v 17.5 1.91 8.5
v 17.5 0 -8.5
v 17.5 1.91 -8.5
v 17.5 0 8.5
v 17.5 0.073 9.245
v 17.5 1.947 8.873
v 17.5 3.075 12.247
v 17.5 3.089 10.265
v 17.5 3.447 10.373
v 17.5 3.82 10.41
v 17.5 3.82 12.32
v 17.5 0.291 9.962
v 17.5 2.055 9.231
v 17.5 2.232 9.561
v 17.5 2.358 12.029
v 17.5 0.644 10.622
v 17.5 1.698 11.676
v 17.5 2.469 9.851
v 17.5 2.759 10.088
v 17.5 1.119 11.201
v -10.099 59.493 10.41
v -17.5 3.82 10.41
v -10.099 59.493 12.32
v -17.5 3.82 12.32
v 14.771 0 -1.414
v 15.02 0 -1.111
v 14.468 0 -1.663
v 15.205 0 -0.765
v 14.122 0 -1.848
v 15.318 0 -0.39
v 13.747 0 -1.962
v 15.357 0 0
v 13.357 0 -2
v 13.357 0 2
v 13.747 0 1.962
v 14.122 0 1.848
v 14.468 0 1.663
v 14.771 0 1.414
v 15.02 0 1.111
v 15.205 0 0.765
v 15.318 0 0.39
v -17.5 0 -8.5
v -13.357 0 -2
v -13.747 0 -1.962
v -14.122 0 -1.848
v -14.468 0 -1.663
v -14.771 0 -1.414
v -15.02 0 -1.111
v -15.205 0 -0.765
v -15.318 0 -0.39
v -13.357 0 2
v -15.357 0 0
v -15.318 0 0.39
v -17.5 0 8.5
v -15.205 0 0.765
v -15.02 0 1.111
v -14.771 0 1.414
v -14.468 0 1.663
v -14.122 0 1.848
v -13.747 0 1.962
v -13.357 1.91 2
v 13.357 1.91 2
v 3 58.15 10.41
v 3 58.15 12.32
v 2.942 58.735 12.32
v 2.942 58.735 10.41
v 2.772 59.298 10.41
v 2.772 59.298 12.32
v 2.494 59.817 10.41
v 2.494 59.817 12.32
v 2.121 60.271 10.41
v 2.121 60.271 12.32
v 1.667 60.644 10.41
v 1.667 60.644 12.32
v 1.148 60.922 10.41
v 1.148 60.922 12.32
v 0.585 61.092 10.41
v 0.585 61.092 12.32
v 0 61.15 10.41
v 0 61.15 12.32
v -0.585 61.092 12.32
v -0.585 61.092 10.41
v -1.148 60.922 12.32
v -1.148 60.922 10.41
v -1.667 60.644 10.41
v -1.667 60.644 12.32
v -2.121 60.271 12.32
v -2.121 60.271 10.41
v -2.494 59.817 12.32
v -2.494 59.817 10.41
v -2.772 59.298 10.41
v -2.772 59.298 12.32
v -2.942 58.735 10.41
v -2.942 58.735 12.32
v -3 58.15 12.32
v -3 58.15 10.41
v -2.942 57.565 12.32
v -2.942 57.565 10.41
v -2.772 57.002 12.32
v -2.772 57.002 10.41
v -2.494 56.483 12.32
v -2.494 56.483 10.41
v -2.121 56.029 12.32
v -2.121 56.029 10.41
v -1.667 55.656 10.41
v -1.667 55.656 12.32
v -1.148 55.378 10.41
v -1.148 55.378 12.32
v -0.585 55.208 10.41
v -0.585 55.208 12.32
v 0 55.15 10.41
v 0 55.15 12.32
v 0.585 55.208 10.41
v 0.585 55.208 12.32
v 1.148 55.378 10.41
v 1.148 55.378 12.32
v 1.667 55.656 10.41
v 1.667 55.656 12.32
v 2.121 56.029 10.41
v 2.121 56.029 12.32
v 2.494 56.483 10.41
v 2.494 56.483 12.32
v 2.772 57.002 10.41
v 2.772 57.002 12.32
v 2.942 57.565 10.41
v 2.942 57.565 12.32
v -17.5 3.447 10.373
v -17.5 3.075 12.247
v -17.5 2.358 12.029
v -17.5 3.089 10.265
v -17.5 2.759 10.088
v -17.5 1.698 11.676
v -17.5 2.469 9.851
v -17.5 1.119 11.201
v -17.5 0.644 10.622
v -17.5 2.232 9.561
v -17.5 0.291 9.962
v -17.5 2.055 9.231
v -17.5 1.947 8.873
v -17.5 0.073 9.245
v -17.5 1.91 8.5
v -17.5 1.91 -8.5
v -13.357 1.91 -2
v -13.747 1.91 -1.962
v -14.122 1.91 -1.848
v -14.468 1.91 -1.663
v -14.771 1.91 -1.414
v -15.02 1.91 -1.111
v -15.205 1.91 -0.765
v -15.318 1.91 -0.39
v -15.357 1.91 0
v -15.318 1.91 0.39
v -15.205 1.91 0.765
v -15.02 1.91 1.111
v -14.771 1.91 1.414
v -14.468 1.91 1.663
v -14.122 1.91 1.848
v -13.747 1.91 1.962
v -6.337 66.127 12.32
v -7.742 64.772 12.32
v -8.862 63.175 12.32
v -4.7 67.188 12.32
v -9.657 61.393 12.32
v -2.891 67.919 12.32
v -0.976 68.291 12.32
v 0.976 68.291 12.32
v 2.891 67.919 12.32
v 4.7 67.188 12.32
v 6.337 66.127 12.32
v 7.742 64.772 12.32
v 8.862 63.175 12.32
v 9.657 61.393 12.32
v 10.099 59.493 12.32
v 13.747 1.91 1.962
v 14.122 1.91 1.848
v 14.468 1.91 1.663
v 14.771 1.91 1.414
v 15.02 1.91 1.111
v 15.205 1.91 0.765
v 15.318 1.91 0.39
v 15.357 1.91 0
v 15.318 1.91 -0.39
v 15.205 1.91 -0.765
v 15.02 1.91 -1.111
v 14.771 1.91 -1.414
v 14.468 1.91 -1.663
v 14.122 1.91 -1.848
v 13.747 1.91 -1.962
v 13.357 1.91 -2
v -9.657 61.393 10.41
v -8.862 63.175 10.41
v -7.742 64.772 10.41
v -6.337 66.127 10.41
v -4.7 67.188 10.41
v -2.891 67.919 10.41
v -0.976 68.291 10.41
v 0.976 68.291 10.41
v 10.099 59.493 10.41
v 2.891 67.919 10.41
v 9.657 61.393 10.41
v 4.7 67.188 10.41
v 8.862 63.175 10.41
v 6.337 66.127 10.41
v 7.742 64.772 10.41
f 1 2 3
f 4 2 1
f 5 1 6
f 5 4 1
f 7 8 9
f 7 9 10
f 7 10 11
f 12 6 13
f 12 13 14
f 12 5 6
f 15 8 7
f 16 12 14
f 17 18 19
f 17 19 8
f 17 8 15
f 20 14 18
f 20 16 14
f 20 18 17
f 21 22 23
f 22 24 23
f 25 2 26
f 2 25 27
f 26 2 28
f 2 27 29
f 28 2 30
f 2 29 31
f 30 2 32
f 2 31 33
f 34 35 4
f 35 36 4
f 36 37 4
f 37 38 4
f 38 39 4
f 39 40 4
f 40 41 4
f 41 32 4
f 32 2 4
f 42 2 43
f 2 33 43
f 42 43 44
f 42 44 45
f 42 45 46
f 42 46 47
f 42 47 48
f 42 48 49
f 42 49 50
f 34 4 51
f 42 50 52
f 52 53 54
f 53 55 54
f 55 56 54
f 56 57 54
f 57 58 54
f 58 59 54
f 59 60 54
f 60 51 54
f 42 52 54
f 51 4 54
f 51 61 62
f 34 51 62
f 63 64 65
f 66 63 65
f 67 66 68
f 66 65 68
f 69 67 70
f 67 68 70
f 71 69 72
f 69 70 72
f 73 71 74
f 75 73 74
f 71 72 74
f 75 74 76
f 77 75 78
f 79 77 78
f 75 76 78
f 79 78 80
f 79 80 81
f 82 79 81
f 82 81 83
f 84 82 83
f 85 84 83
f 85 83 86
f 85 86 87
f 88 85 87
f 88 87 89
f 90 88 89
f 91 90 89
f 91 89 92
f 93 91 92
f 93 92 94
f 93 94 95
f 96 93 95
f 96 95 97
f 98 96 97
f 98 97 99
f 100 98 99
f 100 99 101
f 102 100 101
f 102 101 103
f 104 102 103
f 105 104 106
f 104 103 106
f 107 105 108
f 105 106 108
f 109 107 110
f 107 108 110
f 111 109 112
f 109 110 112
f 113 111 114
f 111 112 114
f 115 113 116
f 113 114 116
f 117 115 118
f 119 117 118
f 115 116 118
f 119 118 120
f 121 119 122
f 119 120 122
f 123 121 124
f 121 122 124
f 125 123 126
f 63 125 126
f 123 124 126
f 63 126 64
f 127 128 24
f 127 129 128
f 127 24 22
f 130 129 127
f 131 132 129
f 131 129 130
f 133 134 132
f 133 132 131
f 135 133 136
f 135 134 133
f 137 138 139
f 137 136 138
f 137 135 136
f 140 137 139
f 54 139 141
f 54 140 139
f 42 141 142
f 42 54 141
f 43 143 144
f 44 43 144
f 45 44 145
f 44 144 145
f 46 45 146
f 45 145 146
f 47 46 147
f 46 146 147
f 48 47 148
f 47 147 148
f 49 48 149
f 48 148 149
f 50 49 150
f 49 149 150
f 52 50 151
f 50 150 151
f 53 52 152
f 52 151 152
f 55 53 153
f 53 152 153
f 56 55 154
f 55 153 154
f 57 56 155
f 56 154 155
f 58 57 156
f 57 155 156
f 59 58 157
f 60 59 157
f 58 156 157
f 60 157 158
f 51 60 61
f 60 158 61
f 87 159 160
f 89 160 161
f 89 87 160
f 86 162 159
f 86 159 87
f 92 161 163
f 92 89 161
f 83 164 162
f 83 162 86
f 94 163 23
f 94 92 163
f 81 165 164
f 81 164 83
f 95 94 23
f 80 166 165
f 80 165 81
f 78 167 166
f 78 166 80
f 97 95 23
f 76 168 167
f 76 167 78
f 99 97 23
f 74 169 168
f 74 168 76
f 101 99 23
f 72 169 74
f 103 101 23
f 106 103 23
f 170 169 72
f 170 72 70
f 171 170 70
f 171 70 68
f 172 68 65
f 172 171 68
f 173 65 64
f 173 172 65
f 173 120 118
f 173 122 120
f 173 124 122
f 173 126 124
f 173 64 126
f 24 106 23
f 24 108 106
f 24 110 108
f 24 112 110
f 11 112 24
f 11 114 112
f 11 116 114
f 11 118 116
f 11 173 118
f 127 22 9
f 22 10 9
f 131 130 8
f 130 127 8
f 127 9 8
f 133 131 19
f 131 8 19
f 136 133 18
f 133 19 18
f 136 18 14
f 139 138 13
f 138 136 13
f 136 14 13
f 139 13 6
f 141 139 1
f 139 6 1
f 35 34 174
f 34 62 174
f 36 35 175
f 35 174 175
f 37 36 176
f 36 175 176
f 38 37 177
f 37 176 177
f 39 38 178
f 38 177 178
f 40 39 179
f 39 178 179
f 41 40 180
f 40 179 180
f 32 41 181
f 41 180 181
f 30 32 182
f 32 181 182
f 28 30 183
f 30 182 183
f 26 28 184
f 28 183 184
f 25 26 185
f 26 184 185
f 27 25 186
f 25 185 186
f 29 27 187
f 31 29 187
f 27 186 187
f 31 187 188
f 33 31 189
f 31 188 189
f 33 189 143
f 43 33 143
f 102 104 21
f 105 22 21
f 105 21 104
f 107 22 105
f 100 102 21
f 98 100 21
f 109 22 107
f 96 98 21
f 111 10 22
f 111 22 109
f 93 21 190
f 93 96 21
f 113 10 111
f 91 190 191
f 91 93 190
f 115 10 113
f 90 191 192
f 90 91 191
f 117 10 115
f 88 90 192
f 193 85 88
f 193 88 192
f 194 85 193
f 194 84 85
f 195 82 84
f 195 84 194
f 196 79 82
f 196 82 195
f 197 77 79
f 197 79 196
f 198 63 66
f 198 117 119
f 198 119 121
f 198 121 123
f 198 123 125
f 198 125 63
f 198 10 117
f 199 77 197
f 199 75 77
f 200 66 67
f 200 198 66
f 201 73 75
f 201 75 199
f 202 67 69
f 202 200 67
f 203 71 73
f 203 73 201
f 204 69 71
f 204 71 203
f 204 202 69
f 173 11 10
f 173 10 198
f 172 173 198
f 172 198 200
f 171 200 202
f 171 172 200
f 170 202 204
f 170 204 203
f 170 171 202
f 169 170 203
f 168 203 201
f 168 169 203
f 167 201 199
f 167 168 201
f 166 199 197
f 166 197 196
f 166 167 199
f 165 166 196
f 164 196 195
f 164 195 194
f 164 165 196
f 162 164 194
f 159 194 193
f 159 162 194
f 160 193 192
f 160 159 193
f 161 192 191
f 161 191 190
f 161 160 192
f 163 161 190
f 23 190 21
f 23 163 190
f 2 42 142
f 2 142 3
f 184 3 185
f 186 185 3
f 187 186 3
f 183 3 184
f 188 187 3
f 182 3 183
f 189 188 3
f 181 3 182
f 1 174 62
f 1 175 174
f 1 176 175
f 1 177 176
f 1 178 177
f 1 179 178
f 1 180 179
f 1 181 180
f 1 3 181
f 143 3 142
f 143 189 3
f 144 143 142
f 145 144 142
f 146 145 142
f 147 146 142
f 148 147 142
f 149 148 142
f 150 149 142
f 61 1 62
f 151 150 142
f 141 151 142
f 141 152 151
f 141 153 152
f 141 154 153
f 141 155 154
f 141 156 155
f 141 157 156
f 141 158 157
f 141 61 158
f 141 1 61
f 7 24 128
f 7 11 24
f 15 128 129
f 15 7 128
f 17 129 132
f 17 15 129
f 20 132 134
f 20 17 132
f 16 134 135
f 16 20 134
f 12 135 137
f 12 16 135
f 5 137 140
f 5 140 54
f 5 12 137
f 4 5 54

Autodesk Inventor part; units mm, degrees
ref_plane "YZ Plane" through (0, 0, 0) normal (1, 0, 0) x (0, 1, 0)
ref_plane "XZ Plane" through (0, 0, 0) normal (0, 1, 0) x (-1, 0, 0)
ref_plane "XY Plane" through (0, 0, 0) normal (0, 0, 1) x (1, 0, 0)
sketch "Boceto1" plane through (0, 0, 0) normal (0, 1, 0) x (-1, 0, 0)
  line L0 (-17.5, 8.5) -> (17.5, 8.5)
  line L1 (17.5, 8.5) -> (17.5, -8.5)
  line L2 (17.5, -8.5) -> (-17.5, -8.5)
  line L3 (-17.5, -8.5) -> (-17.5, 8.5)
  line L4 (-17.5, 8.5) -> (17.5, -8.5) construction
  line L5 (17.5, 8.5) -> (-17.5, -8.5) construction
  point P0 (0, 0)
  dimension "d0" = 35
  dimension "d1" = 17
extrude "Placa1" add sketch "Boceto1" along normal blind 1.91
sketch "Boceto2" plane through (17.5, 3.82, 10.41) normal (0, 0, 1) x (1, 0, 0)
  line L0 (-35, 0) -> (0, 0)
  line L1 (0, 0) -> (0, 66.18)
  line L2 (0, 66.18) -> (-35, 66.18)
  line L3 (-35, 66.18) -> (-35, 0)
edge flange "Pestaña1" height 70 angle 90 thickness 1.91 bend radius 1.91 thickness toward (0, 0, 1) relief tear relief width 1.91 relief depth 0.955 edges at (0, 1.91, 8.5) wall of the first edge with corners at (-17.5, 3.82, 10.41) (17.5, 3.82, 10.41) (17.5, 70, 10.41) (-17.5, 70, 10.41)
bend "Doblez1"
corner "Esquina1"
sketch "Boceto5" plane through (-17.5, 70, 12.32) normal (0, 0, 1) x (1, 0, 0)
  arc A0 (27.5986, -10.5074) -> (7.4014, -10.5074) centre (17.5, -11.85) ccw
  line L0 (0, -66.18) -> (7.4014, -10.5074)
  line L1 (35, -66.18) -> (27.5986, -10.5074)
  line L2 (0, 0) -> (35, 0) projected
  line L3 (0, -66.18) -> (0, 0)
  line L4 (0, 0) -> (35, 0)
  line L5 (35, 0) -> (35, -66.18)
  point P0 (17.5, -70)
  dimension "d21" = 20.375
extrude "Cortar2" cut sketch "Boceto5" against normal blind 1.91
sketch "Boceto6" plane through (-17.5, 3.82, 12.32) normal (0, 0, 1) x (1, 0, 0)
  line L0 (7.4014, 55.6726) -> (0, 0) projected
  line L1 (0, 0) -> (35, 0) projected
  line L2 (35, 0) -> (27.5986, 55.6726) projected
  arc A0 (27.5986, 55.6726) -> (7.4014, 55.6726) centre (17.5, 54.33) ccw projected
  circle A1 centre (17.5, 54.33) radius 3
  point P0 (17.5, -3.82)
  dimension "d26" = 6
extrude "Cortar3" cut sketch "Boceto6" against normal blind 1.91 contours A1
sketch "Boceto7" plane through (0, 1.91, 0) normal (0, 1, 0) x (1, 0, 0)
  line L0 (13.3569, 0) -> (-13.3569, 0) construction
  line L1 (13.3569, 2) -> (-13.3569, 2)
  line L2 (-13.3569, -2) -> (13.3569, -2)
  arc A0 (13.3569, -2) -> (13.3569, 2) centre (13.3569, 0) ccw
  arc A1 (-13.3569, 2) -> (-13.3569, -2) centre (-13.3569, 0) ccw
  point P0 (0, 0)
  dimension "d29" = 4
extrude "Cortar4" cut sketch "Boceto7" against normal blind 1.91
equation "\"d24\" = Grosor"
equation "\"d27\" = Grosor"
equation "\"d30\" = Grosor"
equation "\"d2\" = Grosor"
equation "\"d3\" = Anchura_desahogo_plegado"
equation "\"d4\" = Profundidad_desahogo_plegado"
equation "\"d5\" = Remanente_mínimo"
equation "\"d6\" = Radiodetransición"
equation "\"d9\" = Radio_pliegue"
equation "\"d10\" = Tamaño_destalonado"
equation "\"d11\" = TamañoSeparación"
equation "\"d12\" = Tamaño_de_radio_de_Jacobi"
equation "\"Radio_pliegue\" = Grosor"
equation "\"Anchura_desahogo_plegado\" = Grosor"
equation "\"Profundidad_desahogo_plegado\" = 0.5 * Grosor"
equation "\"Tamaño_destalonado\" = 4 * Grosor"
equation "\"Remanente_mínimo\" = 2 * Grosor"
equation "\"Radiodetransición\" = Radio_pliegue"
equation "\"Tamaño_de_radio_de_Jacobi\" = Radio_pliegue"
equation "\"TamañoSeparación\" = Grosor"
equation "\"Grosor\" = 1.91"
properties part number "soporte_barra" material "Acero AISI 1006 85 LC"
